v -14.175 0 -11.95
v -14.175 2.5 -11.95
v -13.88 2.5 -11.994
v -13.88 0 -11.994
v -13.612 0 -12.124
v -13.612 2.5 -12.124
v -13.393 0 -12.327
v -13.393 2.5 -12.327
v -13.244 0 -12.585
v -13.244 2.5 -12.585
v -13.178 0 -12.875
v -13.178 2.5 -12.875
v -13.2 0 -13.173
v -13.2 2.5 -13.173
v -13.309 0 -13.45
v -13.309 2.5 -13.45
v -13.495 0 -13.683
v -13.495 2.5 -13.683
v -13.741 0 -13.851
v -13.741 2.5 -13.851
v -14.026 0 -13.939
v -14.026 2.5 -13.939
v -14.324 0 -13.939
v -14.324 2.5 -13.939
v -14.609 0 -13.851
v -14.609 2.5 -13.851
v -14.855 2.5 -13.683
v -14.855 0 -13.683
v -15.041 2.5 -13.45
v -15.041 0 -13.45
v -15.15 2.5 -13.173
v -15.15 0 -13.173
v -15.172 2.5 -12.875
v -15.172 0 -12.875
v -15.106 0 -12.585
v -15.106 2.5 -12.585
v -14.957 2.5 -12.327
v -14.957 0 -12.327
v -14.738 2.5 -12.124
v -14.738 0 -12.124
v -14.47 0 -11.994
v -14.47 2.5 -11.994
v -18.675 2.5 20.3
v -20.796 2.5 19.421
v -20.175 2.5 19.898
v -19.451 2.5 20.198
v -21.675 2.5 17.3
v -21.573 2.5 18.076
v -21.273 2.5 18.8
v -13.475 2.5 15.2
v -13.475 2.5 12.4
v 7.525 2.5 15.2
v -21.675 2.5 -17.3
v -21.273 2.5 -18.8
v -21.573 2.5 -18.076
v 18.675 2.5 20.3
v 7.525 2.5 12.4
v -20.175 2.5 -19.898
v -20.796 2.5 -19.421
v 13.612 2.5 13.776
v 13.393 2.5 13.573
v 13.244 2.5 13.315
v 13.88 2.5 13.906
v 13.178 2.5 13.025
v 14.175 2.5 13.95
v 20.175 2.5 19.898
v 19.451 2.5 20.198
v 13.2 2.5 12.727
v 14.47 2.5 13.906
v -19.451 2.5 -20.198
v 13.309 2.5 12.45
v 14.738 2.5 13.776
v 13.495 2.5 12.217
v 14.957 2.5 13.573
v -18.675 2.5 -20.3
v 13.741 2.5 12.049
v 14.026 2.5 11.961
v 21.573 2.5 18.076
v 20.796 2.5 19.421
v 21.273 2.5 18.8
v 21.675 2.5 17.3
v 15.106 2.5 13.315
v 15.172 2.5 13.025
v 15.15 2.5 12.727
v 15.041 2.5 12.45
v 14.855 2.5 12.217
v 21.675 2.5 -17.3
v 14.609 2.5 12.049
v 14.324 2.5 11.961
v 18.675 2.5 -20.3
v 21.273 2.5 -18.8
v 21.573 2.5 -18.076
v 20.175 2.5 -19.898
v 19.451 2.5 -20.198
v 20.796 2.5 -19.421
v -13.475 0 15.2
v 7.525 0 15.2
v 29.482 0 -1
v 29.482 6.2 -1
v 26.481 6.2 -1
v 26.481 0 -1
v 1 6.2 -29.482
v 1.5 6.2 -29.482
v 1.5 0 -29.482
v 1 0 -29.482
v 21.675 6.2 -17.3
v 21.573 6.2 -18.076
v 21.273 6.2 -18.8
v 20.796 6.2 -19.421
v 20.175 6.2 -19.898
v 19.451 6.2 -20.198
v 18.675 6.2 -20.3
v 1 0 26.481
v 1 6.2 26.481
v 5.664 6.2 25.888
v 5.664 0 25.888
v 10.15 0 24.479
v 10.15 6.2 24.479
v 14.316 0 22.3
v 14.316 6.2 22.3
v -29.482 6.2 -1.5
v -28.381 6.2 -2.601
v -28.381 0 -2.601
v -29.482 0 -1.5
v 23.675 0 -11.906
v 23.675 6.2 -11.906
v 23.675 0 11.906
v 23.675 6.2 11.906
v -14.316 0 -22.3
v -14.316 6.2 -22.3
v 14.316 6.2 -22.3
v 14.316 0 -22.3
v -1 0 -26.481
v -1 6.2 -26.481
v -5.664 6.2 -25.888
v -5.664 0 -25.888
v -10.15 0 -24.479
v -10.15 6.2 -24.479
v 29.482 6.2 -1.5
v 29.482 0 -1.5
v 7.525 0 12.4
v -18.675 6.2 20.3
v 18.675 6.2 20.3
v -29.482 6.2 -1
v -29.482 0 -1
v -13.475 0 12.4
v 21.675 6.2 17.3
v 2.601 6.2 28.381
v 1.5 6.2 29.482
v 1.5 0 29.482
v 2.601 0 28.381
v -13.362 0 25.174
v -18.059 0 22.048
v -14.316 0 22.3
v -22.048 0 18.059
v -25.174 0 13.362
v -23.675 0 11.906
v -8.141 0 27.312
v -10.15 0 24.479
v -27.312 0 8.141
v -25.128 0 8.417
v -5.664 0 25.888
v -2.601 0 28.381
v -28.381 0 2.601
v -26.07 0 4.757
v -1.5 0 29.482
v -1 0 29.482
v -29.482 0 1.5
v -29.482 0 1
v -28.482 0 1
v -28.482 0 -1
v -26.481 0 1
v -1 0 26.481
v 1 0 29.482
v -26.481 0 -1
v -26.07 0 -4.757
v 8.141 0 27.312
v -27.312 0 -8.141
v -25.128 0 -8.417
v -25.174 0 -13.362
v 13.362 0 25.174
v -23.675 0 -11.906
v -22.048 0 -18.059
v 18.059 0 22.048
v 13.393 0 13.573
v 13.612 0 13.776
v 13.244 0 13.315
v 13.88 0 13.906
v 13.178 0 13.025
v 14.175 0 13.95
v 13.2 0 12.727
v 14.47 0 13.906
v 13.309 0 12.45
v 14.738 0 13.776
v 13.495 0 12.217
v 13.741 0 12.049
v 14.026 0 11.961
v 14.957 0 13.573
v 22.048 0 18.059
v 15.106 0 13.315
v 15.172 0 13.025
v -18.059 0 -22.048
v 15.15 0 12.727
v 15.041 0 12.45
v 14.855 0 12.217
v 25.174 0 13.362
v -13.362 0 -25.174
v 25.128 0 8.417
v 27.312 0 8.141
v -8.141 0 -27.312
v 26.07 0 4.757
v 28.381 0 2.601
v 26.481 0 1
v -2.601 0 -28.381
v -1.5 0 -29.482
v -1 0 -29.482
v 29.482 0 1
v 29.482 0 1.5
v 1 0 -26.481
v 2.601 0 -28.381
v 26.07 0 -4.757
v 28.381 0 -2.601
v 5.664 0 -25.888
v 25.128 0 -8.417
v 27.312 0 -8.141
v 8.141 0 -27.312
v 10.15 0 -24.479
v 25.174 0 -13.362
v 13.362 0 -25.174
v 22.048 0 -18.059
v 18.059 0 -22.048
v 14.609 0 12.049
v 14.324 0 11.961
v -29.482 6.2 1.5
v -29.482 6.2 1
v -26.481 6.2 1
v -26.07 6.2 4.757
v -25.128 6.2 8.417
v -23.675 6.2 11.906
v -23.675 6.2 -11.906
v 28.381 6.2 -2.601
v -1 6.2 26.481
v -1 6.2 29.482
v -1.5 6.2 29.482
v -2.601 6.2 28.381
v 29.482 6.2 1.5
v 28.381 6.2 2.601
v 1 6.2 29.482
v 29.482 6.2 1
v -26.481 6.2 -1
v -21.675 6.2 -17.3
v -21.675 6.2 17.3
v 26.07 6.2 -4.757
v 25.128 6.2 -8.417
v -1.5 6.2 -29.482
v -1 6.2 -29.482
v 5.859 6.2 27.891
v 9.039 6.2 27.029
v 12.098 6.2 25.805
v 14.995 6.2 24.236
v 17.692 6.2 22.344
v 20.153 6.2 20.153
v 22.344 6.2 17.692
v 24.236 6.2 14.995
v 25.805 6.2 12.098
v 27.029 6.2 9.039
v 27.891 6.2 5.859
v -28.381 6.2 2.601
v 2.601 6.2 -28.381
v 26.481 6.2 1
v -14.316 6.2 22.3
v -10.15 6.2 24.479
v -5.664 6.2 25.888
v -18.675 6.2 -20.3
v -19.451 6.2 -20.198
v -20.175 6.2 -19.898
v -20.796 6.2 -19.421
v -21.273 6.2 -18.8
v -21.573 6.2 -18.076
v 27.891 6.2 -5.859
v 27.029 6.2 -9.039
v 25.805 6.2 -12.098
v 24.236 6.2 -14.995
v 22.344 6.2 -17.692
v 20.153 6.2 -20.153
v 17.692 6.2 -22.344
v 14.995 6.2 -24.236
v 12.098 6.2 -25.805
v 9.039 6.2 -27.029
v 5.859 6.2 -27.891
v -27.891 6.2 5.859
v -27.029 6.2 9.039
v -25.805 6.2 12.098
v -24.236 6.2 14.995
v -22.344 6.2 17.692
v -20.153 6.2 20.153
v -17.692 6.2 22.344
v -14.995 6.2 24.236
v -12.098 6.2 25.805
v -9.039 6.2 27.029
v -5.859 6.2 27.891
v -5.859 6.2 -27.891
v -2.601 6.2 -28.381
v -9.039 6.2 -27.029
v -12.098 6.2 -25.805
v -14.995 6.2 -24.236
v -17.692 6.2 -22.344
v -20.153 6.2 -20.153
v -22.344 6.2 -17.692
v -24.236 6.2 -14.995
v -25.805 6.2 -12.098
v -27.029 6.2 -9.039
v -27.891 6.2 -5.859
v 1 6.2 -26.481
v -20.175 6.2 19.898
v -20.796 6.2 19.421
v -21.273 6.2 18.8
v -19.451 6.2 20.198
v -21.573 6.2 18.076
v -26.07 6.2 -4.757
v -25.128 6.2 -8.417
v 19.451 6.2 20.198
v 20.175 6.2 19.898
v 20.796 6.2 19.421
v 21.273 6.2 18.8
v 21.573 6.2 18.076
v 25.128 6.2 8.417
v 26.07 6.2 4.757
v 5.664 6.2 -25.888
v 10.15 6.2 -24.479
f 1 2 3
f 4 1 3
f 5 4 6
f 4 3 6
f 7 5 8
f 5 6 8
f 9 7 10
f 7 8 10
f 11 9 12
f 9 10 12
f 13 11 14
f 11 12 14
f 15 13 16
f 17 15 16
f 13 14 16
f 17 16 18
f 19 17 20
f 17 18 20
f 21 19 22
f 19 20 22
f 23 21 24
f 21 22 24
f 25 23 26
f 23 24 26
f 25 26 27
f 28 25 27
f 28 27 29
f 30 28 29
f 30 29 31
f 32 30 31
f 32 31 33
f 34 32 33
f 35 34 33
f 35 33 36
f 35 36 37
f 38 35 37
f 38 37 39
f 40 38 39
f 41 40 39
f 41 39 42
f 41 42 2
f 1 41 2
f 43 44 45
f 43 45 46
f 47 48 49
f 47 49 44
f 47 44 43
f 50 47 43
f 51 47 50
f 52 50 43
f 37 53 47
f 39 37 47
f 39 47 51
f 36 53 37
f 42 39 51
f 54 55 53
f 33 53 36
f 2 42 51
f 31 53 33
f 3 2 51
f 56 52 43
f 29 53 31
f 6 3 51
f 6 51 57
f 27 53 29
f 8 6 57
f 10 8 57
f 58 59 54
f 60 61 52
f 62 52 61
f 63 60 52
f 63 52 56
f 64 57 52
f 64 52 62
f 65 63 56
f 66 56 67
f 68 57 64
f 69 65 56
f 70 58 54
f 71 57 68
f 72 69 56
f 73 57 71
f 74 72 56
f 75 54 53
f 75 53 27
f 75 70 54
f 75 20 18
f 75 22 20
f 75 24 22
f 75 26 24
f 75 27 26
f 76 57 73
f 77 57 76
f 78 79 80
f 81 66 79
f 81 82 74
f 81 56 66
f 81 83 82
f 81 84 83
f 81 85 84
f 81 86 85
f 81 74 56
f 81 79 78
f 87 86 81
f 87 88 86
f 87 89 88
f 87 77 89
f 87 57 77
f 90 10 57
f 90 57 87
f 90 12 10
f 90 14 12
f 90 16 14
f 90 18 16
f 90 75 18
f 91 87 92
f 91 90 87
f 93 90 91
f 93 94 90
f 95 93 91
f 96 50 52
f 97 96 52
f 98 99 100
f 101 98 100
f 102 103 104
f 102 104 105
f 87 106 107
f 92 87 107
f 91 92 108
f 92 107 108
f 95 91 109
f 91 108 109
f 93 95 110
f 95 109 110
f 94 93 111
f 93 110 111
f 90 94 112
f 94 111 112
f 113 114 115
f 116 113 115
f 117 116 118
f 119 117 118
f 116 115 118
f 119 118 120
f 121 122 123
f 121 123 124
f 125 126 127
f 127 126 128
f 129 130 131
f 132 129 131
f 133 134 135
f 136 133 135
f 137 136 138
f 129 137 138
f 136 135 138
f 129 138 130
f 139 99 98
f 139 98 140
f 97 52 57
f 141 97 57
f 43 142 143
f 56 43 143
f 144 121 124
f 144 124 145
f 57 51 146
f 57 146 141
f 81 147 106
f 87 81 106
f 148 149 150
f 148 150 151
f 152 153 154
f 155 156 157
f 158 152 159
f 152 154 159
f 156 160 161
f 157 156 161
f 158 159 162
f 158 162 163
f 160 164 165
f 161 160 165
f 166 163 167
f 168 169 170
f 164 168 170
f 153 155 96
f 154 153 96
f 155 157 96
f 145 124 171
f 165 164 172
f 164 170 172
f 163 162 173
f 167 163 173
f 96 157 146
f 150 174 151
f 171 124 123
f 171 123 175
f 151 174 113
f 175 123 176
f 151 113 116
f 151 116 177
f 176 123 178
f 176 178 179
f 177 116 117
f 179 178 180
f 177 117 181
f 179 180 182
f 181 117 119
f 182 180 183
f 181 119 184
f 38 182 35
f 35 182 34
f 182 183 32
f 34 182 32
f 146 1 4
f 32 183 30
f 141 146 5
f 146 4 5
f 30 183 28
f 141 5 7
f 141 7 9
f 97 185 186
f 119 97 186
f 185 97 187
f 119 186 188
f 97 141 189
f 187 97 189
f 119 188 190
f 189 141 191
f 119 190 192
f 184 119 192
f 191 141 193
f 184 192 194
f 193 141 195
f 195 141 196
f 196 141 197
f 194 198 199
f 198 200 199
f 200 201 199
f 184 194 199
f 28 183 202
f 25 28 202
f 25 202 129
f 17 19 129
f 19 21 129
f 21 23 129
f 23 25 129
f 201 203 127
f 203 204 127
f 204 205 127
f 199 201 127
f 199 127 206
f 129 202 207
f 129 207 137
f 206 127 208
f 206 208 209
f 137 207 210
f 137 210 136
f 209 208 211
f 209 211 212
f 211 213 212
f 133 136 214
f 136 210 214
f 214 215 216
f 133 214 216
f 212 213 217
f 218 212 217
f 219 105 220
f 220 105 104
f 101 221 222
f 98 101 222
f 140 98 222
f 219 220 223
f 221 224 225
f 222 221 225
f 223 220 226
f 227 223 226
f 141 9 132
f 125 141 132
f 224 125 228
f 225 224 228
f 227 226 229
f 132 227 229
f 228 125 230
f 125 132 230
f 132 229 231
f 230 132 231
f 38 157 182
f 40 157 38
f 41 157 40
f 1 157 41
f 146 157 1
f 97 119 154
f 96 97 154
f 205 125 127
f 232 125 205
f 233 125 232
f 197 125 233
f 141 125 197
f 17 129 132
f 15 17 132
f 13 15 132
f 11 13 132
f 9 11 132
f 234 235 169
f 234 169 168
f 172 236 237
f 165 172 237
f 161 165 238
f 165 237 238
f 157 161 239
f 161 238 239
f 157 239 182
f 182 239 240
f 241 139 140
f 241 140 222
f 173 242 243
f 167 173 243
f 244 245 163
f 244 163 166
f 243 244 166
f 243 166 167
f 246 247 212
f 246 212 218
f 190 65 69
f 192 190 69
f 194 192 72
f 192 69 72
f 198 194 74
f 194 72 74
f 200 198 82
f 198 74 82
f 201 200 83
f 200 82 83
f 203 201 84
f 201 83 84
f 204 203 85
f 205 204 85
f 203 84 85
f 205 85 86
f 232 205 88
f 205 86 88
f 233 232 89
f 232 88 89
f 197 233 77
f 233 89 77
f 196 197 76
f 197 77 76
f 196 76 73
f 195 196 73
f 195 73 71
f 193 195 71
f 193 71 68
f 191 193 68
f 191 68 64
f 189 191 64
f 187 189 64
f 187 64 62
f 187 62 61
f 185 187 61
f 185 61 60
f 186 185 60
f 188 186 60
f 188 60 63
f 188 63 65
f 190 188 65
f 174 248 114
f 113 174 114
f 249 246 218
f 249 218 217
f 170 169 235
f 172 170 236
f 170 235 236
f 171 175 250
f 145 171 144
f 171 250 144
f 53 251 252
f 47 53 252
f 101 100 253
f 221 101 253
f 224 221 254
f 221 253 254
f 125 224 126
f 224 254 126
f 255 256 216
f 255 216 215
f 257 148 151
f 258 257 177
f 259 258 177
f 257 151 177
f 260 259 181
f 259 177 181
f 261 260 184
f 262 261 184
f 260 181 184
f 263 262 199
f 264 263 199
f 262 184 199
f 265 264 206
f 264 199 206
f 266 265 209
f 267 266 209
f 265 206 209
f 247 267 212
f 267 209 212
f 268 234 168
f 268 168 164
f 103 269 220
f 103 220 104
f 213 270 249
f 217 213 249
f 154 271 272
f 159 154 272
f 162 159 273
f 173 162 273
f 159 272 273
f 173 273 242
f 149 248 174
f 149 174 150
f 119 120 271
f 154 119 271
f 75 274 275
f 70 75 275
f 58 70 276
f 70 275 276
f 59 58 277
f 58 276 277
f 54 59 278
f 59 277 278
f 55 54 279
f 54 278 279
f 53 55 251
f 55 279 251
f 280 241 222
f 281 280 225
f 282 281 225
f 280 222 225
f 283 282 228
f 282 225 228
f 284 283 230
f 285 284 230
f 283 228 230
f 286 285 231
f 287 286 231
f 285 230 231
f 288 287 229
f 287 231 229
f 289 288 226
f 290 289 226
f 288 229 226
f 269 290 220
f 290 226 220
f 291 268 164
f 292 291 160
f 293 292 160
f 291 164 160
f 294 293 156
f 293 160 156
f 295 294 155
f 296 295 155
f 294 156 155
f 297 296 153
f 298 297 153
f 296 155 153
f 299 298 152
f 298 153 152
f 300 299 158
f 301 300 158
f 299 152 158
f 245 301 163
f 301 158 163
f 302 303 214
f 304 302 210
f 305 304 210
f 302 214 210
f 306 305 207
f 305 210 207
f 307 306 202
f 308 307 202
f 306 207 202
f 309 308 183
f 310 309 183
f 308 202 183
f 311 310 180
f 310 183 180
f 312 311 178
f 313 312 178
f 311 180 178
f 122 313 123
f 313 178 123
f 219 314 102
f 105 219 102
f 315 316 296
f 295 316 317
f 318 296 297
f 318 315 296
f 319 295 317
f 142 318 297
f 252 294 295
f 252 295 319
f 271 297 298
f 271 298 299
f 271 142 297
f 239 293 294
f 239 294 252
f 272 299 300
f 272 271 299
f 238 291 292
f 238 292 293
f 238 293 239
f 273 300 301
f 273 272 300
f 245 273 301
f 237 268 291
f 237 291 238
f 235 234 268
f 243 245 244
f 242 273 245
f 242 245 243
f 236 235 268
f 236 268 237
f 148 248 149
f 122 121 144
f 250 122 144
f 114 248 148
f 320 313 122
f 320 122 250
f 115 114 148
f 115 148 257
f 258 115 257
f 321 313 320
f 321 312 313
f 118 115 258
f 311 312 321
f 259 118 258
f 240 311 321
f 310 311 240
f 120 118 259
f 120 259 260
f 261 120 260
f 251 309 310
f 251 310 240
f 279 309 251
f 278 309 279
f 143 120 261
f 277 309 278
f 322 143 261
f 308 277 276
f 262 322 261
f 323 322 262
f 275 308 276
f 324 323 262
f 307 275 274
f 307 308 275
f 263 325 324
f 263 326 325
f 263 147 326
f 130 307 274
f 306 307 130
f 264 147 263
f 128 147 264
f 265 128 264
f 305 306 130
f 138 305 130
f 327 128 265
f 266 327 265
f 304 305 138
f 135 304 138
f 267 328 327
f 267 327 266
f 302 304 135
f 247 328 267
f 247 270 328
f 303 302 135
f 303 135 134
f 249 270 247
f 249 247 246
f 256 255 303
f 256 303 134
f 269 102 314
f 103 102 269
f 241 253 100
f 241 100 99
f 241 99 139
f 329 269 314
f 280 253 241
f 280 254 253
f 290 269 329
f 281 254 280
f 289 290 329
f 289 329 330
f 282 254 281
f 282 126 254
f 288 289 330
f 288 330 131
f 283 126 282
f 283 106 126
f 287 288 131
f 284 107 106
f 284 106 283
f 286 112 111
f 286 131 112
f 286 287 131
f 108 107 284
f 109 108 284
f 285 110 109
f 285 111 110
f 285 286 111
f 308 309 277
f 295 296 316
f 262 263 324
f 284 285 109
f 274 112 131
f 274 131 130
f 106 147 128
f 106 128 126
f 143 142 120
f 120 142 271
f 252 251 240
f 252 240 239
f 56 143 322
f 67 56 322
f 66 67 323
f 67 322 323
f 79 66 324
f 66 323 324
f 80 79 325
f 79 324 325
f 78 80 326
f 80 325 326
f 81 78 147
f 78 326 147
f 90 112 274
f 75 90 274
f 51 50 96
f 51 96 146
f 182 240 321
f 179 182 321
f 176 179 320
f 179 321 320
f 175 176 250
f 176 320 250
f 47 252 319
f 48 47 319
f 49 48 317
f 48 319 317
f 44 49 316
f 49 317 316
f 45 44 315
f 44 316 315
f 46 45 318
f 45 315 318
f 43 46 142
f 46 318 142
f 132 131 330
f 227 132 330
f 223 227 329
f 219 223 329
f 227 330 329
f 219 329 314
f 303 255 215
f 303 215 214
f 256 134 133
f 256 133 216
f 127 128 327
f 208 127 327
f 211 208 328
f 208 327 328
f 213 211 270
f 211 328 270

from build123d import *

# Parameters (mm, degrees)
SKETCH1_R           = 28.5
BOSS_EXTRUDE1_DEPTH = 6.2
CUT_EXTRUDE1_DEPTH  = 3.7
CUT_EXTRUDE2_REACH  = 42.475
SKETCH3_R           = 1
SKETCH3_W           = 21
SKETCH3_H           = 2.8
CUT_EXTRUDE3_REACH  = 42.779
BOSS_EXTRUDE2_DEPTH = 6.2


with BuildPart() as part:
    # Sketch1 → Boss-Extrude1 (new body)
    with BuildSketch(Plane(origin=(0, 0, 0), x_dir=(1, 0, 0), z_dir=(0, 1, 0))):
        with Locations(Location((0, 0, 0), (0, 0, 90))):
            Circle(SKETCH1_R)
    extrude(amount=BOSS_EXTRUDE1_DEPTH)

    # Sketch2 → Cut-Extrude1 (cut)
    with BuildSketch(Plane(origin=(0, 6.2, 0), x_dir=(1, 0, 0), z_dir=(0, 1, 0))):
        with BuildLine():
            Line((18.675, 20.3), (-18.675, 20.3))
            ThreePointArc((-18.675, 20.3), (-20.796320344, 19.421320344), (-21.675, 17.3))
            Line((-21.675, 17.3), (-21.675, -17.3))
            ThreePointArc((-21.675, -17.3), (-20.796320374, -19.421320313), (-18.675000086, -20.3))
            Line((-18.675000086, -20.3), (18.675, -20.3))
            ThreePointArc((18.675, -20.3), (20.796320344, -19.421320344), (21.675, -17.3))
            Line((21.675, -17.3), (21.675, 17.3))
            ThreePointArc((21.675, 17.3), (20.796320344, 19.421320344), (18.675, 20.3))
        make_face()
    extrude(amount=-CUT_EXTRUDE1_DEPTH, mode=Mode.SUBTRACT)

    # Sketch3 → Cut-Extrude2 (cut, up to next)
    with BuildSketch(Plane(origin=(0, 2.5, 0), x_dir=(1, 0, 0), z_dir=(0, 1, 0)), mode=Mode.PRIVATE) as cut_extrude2_sk1:
        with Locations(Location((-14.175, 12.95, 0), (0, 0, 270))):
            Circle(SKETCH3_R)
    cut_extrude2_tool1 = extrude(cut_extrude2_sk1.sketch, amount=-CUT_EXTRUDE2_REACH, mode=Mode.PRIVATE) & part.part
    # Sketch3 → Cut-Extrude2 (cut, up to next)
    with BuildSketch(Plane(origin=(0, 2.5, 0), x_dir=(1, 0, 0), z_dir=(0, 1, 0)), mode=Mode.PRIVATE) as cut_extrude2_sk2:
        with Locations((-2.975, -13.8)):
            Rectangle(SKETCH3_W, SKETCH3_H)
    cut_extrude2_tool2 = extrude(cut_extrude2_sk2.sketch, amount=-CUT_EXTRUDE2_REACH, mode=Mode.PRIVATE) & part.part
    # Sketch3 → Cut-Extrude2 (cut, up to next)
    with BuildSketch(Plane(origin=(0, 2.5, 0), x_dir=(1, 0, 0), z_dir=(0, 1, 0)), mode=Mode.PRIVATE) as cut_extrude2_sk3:
        with Locations(Location((14.175, -12.95, 0), (0, 0, 270))):
            Circle(SKETCH3_R)
    cut_extrude2_tool3 = extrude(cut_extrude2_sk3.sketch, amount=-CUT_EXTRUDE2_REACH, mode=Mode.PRIVATE) & part.part
    add(cut_extrude2_tool1.solids().sort_by_distance((-14.175, 2.5, -12.95))[0], mode=Mode.SUBTRACT)
    add(cut_extrude2_tool2.solids().sort_by_distance((-2.975, 2.5, 13.8))[0], mode=Mode.SUBTRACT)
    add(cut_extrude2_tool3.solids().sort_by_distance((14.175, 2.5, 12.95))[0], mode=Mode.SUBTRACT)

    # Sketch4 → Cut-Extrude3 (cut, up to next)
    with BuildSketch(Plane(origin=(0, 6.2, 0), x_dir=(1, 0, 0), z_dir=(0, 1, 0)), mode=Mode.PRIVATE) as cut_extrude3_sk1:
        with BuildLine():
            ThreePointArc((-1, 26.481125354), (-7.938429591, 25.283024653), (-14.316424135, 22.3))
            Line((-14.316424135, 22.3), (-1, 22.3))
            Line((-1, 22.3), (-1, 26.481125354))
        make_face()
    cut_extrude3_tool1 = extrude(cut_extrude3_sk1.sketch, amount=-CUT_EXTRUDE3_REACH, mode=Mode.PRIVATE) & part.part
    # Sketch4 → Cut-Extrude3 (cut, up to next)
    with BuildSketch(Plane(origin=(0, 6.2, 0), x_dir=(1, 0, 0), z_dir=(0, 1, 0)), mode=Mode.PRIVATE) as cut_extrude3_sk2:
        with BuildLine():
            Line((1, 26.481125354), (1, 22.3))
            Line((1, 22.3), (14.316424135, 22.3))
            ThreePointArc((14.316424135, 22.3), (7.938429591, 25.283024653), (1, 26.481125354))
        make_face()
    cut_extrude3_tool2 = extrude(cut_extrude3_sk2.sketch, amount=-CUT_EXTRUDE3_REACH, mode=Mode.PRIVATE) & part.part
    # Sketch4 → Cut-Extrude3 (cut, up to next)
    with BuildSketch(Plane(origin=(0, 6.2, 0), x_dir=(1, 0, 0), z_dir=(0, 1, 0)), mode=Mode.PRIVATE) as cut_extrude3_sk3:
        with BuildLine():
            ThreePointArc((0, 28.5), (-0.500076988, 28.495612347), (-1, 28.482450737))
            Line((-1, 28.482450737), (-1, 26.481125354))
            ThreePointArc((-1, 26.481125354), (0, 26.5), (1, 26.481125354))
            Line((1, 26.481125354), (1, 28.482450737))
            ThreePointArc((1, 28.482450737), (0.500076988, 28.495612347), (0, 28.5))
        make_face()
    cut_extrude3_tool3 = extrude(cut_extrude3_sk3.sketch, amount=-CUT_EXTRUDE3_REACH, mode=Mode.PRIVATE) & part.part
    # Sketch4 → Cut-Extrude3 (cut, up to next)
    with BuildSketch(Plane(origin=(0, 6.2, 0), x_dir=(1, 0, 0), z_dir=(0, 1, 0)), mode=Mode.PRIVATE) as cut_extrude3_sk4:
        with BuildLine():
            Line((-1, -26.481125354), (-1, -28.482450737))
            ThreePointArc((-1, -28.482450737), (-0.500077047, -28.495612346), (-1.18e-07, -28.5))
            ThreePointArc((-1.18e-07, -28.5), (0.500076929, -28.495612348), (1, -28.482450737))
            Line((1, -28.482450737), (1, -26.481125354))
            ThreePointArc((1, -26.481125354), (0, -26.5), (-1, -26.481125354))
        make_face()
    cut_extrude3_tool4 = extrude(cut_extrude3_sk4.sketch, amount=-CUT_EXTRUDE3_REACH, mode=Mode.PRIVATE) & part.part
    # Sketch4 → Cut-Extrude3 (cut, up to next)
    with BuildSketch(Plane(origin=(0, 6.2, 0), x_dir=(1, 0, 0), z_dir=(0, 1, 0)), mode=Mode.PRIVATE) as cut_extrude3_sk5:
        with BuildLine():
            Line((-1, 26.481125354), (-1, 22.3))
            Line((-1, 22.3), (1, 22.3))
            Line((1, 22.3), (1, 26.481125354))
            ThreePointArc((1, 26.481125354), (0, 26.5), (-1, 26.481125354))
        make_face()
    cut_extrude3_tool5 = extrude(cut_extrude3_sk5.sketch, amount=-CUT_EXTRUDE3_REACH, mode=Mode.PRIVATE) & part.part
    # Sketch4 → Cut-Extrude3 (cut, up to next)
    with BuildSketch(Plane(origin=(0, 6.2, 0), x_dir=(1, 0, 0), z_dir=(0, 1, 0)), mode=Mode.PRIVATE) as cut_extrude3_sk6:
        with BuildLine():
            Line((-26.481125354, 1), (-28.482450737, 1))
            ThreePointArc((-28.482450737, 1), (-28.495612347, 0.500076988), (-28.5, 0))
            ThreePointArc((-28.5, 0), (-28.495612347, -0.500076988), (-28.482450737, -1))
            Line((-28.482450737, -1), (-26.481125354, -1))
            ThreePointArc((-26.481125354, -1), (-26.5, 0), (-26.481125354, 1))
        make_face()
    cut_extrude3_tool6 = extrude(cut_extrude3_sk6.sketch, amount=-CUT_EXTRUDE3_REACH, mode=Mode.PRIVATE) & part.part
    # Sketch4 → Cut-Extrude3 (cut, up to next)
    with BuildSketch(Plane(origin=(0, 6.2, 0), x_dir=(1, 0, 0), z_dir=(0, 1, 0)), mode=Mode.PRIVATE) as cut_extrude3_sk7:
        with BuildLine():
            Line((28.482450737, 1), (26.481125354, 1))
            ThreePointArc((26.481125354, 1), (26.495280918, 0.500089055), (26.5, 0))
            ThreePointArc((26.5, 0), (26.495280918, -0.500089055), (26.481125354, -1))
            Line((26.481125354, -1), (28.482450737, -1))
            ThreePointArc((28.482450737, -1), (28.495612347, -0.500076988), (28.5, 0))
            ThreePointArc((28.5, 0), (28.495612347, 0.500076988), (28.482450737, 1))
        make_face()
    cut_extrude3_tool7 = extrude(cut_extrude3_sk7.sketch, amount=-CUT_EXTRUDE3_REACH, mode=Mode.PRIVATE) & part.part
    # Sketch4 → Cut-Extrude3 (cut, up to next)
    with BuildSketch(Plane(origin=(0, 6.2, 0), x_dir=(1, 0, 0), z_dir=(0, 1, 0)), mode=Mode.PRIVATE) as cut_extrude3_sk8:
        with BuildLine():
            Line((-23.675, 1), (-26.481125354, 1))
            ThreePointArc((-26.481125354, 1), (-26.5, 0), (-26.481125354, -1))
            Line((-26.481125354, -1), (-23.675, -1))
            Line((-23.675, -1), (-23.675, 1))
        make_face()
    cut_extrude3_tool8 = extrude(cut_extrude3_sk8.sketch, amount=-CUT_EXTRUDE3_REACH, mode=Mode.PRIVATE) & part.part
    # Sketch4 → Cut-Extrude3 (cut, up to next)
    with BuildSketch(Plane(origin=(0, 6.2, 0), x_dir=(1, 0, 0), z_dir=(0, 1, 0)), mode=Mode.PRIVATE) as cut_extrude3_sk9:
        with BuildLine():
            ThreePointArc((-23.675, 11.90564467), (-25.664031231, 6.603597577), (-26.481125354, 1))
            Line((-26.481125354, 1), (-23.675, 1))
            Line((-23.675, 1), (-23.675, 11.90564467))
        make_face()
    cut_extrude3_tool9 = extrude(cut_extrude3_sk9.sketch, amount=-CUT_EXTRUDE3_REACH, mode=Mode.PRIVATE) & part.part
    # Sketch4 → Cut-Extrude3 (cut, up to next)
    with BuildSketch(Plane(origin=(0, 6.2, 0), x_dir=(1, 0, 0), z_dir=(0, 1, 0)), mode=Mode.PRIVATE) as cut_extrude3_sk10:
        with BuildLine():
            Line((-23.675, -1), (-26.481125354, -1))
            ThreePointArc((-26.481125354, -1), (-25.664031231, -6.603597577), (-23.675, -11.90564467))
            Line((-23.675, -11.90564467), (-23.675, -1))
        make_face()
    cut_extrude3_tool10 = extrude(cut_extrude3_sk10.sketch, amount=-CUT_EXTRUDE3_REACH, mode=Mode.PRIVATE) & part.part
    # Sketch4 → Cut-Extrude3 (cut, up to next)
    with BuildSketch(Plane(origin=(0, 6.2, 0), x_dir=(1, 0, 0), z_dir=(0, 1, 0)), mode=Mode.PRIVATE) as cut_extrude3_sk11:
        with BuildLine():
            Line((-1, -22.3), (-14.316424135, -22.3))
            ThreePointArc((-14.316424135, -22.3), (-7.938429591, -25.283024653), (-1, -26.481125354))
            Line((-1, -26.481125354), (-1, -22.3))
        make_face()
    cut_extrude3_tool11 = extrude(cut_extrude3_sk11.sketch, amount=-CUT_EXTRUDE3_REACH, mode=Mode.PRIVATE) & part.part
    # Sketch4 → Cut-Extrude3 (cut, up to next)
    with BuildSketch(Plane(origin=(0, 6.2, 0), x_dir=(1, 0, 0), z_dir=(0, 1, 0)), mode=Mode.PRIVATE) as cut_extrude3_sk12:
        with BuildLine():
            Line((14.316424135, -22.3), (1, -22.3))
            Line((1, -22.3), (1, -26.481125354))
            ThreePointArc((1, -26.481125354), (7.938429591, -25.283024653), (14.316424135, -22.3))
        make_face()
    cut_extrude3_tool12 = extrude(cut_extrude3_sk12.sketch, amount=-CUT_EXTRUDE3_REACH, mode=Mode.PRIVATE) & part.part
    # Sketch4 → Cut-Extrude3 (cut, up to next)
    with BuildSketch(Plane(origin=(0, 6.2, 0), x_dir=(1, 0, 0), z_dir=(0, 1, 0)), mode=Mode.PRIVATE) as cut_extrude3_sk13:
        with BuildLine():
            Line((1, -22.3), (-1, -22.3))
            Line((-1, -22.3), (-1, -26.481125354))
            ThreePointArc((-1, -26.481125354), (0, -26.5), (1, -26.481125354))
            Line((1, -26.481125354), (1, -22.3))
        make_face()
    cut_extrude3_tool13 = extrude(cut_extrude3_sk13.sketch, amount=-CUT_EXTRUDE3_REACH, mode=Mode.PRIVATE) & part.part
    # Sketch4 → Cut-Extrude3 (cut, up to next)
    with BuildSketch(Plane(origin=(0, 6.2, 0), x_dir=(1, 0, 0), z_dir=(0, 1, 0)), mode=Mode.PRIVATE) as cut_extrude3_sk14:
        with BuildLine():
            ThreePointArc((0, 28.5), (-0.500076988, 28.495612347), (-1, 28.482450737))
            Line((-1, 28.482450737), (-1, 26.481125354))
            ThreePointArc((-1, 26.481125354), (0, 26.5), (1, 26.481125354))
            Line((1, 26.481125354), (1, 28.482450737))
            ThreePointArc((1, 28.482450737), (0.500076988, 28.495612347), (0, 28.5))
        make_face()
    cut_extrude3_tool14 = extrude(cut_extrude3_sk14.sketch, amount=-CUT_EXTRUDE3_REACH, mode=Mode.PRIVATE) & part.part
    # Sketch4 → Cut-Extrude3 (cut, up to next)
    with BuildSketch(Plane(origin=(0, 6.2, 0), x_dir=(1, 0, 0), z_dir=(0, 1, 0)), mode=Mode.PRIVATE) as cut_extrude3_sk15:
        with BuildLine():
            Line((-1, -26.481125354), (-1, -28.482450737))
            ThreePointArc((-1, -28.482450737), (-0.500077047, -28.495612346), (-1.18e-07, -28.5))
            ThreePointArc((-1.18e-07, -28.5), (0.500076929, -28.495612348), (1, -28.482450737))
            Line((1, -28.482450737), (1, -26.481125354))
            ThreePointArc((1, -26.481125354), (0, -26.5), (-1, -26.481125354))
        make_face()
    cut_extrude3_tool15 = extrude(cut_extrude3_sk15.sketch, amount=-CUT_EXTRUDE3_REACH, mode=Mode.PRIVATE) & part.part
    # Sketch4 → Cut-Extrude3 (cut, up to next)
    with BuildSketch(Plane(origin=(0, 6.2, 0), x_dir=(1, 0, 0), z_dir=(0, 1, 0)), mode=Mode.PRIVATE) as cut_extrude3_sk16:
        with BuildLine():
            Line((23.675, 11.90564467), (23.675, 1))
            Line((23.675, 1), (26.481125354, 1))
            ThreePointArc((26.481125354, 1), (25.664031231, 6.603597577), (23.675, 11.90564467))
        make_face()
    cut_extrude3_tool16 = extrude(cut_extrude3_sk16.sketch, amount=-CUT_EXTRUDE3_REACH, mode=Mode.PRIVATE) & part.part
    # Sketch4 → Cut-Extrude3 (cut, up to next)
    with BuildSketch(Plane(origin=(0, 6.2, 0), x_dir=(1, 0, 0), z_dir=(0, 1, 0)), mode=Mode.PRIVATE) as cut_extrude3_sk17:
        with BuildLine():
            Line((26.481125354, -1), (23.675, -1))
            Line((23.675, -1), (23.675, -11.90564467))
            ThreePointArc((23.675, -11.90564467), (25.664031231, -6.603597577), (26.481125354, -1))
        make_face()
    cut_extrude3_tool17 = extrude(cut_extrude3_sk17.sketch, amount=-CUT_EXTRUDE3_REACH, mode=Mode.PRIVATE) & part.part
    # Sketch4 → Cut-Extrude3 (cut, up to next)
    with BuildSketch(Plane(origin=(0, 6.2, 0), x_dir=(1, 0, 0), z_dir=(0, 1, 0)), mode=Mode.PRIVATE) as cut_extrude3_sk18:
        with BuildLine():
            Line((26.481125354, 1), (23.675, 1))
            Line((23.675, 1), (23.675, -1))
            Line((23.675, -1), (26.481125354, -1))
            ThreePointArc((26.481125354, -1), (26.495280918, -0.500089055), (26.5, 0))
            ThreePointArc((26.5, 0), (26.495280918, 0.500089055), (26.481125354, 1))
        make_face()
    cut_extrude3_tool18 = extrude(cut_extrude3_sk18.sketch, amount=-CUT_EXTRUDE3_REACH, mode=Mode.PRIVATE) & part.part
    # Sketch4 → Cut-Extrude3 (cut, up to next)
    with BuildSketch(Plane(origin=(0, 6.2, 0), x_dir=(1, 0, 0), z_dir=(0, 1, 0)), mode=Mode.PRIVATE) as cut_extrude3_sk19:
        with BuildLine():
            Line((-26.481125354, 1), (-28.482450737, 1))
            ThreePointArc((-28.482450737, 1), (-28.495612347, 0.500076988), (-28.5, 0))
            ThreePointArc((-28.5, 0), (-28.495612347, -0.500076988), (-28.482450737, -1))
            Line((-28.482450737, -1), (-26.481125354, -1))
            ThreePointArc((-26.481125354, -1), (-26.5, 0), (-26.481125354, 1))
        make_face()
    cut_extrude3_tool19 = extrude(cut_extrude3_sk19.sketch, amount=-CUT_EXTRUDE3_REACH, mode=Mode.PRIVATE) & part.part
    # Sketch4 → Cut-Extrude3 (cut, up to next)
    with BuildSketch(Plane(origin=(0, 6.2, 0), x_dir=(1, 0, 0), z_dir=(0, 1, 0)), mode=Mode.PRIVATE) as cut_extrude3_sk20:
        with BuildLine():
            Line((28.482450737, 1), (26.481125354, 1))
            ThreePointArc((26.481125354, 1), (26.495280918, 0.500089055), (26.5, 0))
            ThreePointArc((26.5, 0), (26.495280918, -0.500089055), (26.481125354, -1))
            Line((26.481125354, -1), (28.482450737, -1))
            ThreePointArc((28.482450737, -1), (28.495612347, -0.500076988), (28.5, 0))
            ThreePointArc((28.5, 0), (28.495612347, 0.500076988), (28.482450737, 1))
        make_face()
    cut_extrude3_tool20 = extrude(cut_extrude3_sk20.sketch, amount=-CUT_EXTRUDE3_REACH, mode=Mode.PRIVATE) & part.part
    add(cut_extrude3_tool1.solids().sort_by_distance((-5.995694, 6.2, -23.945534))[0], mode=Mode.SUBTRACT)
    add(cut_extrude3_tool2.solids().sort_by_distance((5.995694, 6.2, -23.945534))[0], mode=Mode.SUBTRACT)
    add(cut_extrude3_tool3.solids().sort_by_distance((0, 6.2, -27.493929))[0], mode=Mode.SUBTRACT)
    add(cut_extrude3_tool4.solids().sort_by_distance((0, 6.2, 27.493929))[0], mode=Mode.SUBTRACT)
    add(cut_extrude3_tool5.solids().sort_by_distance((0, 6.2, -24.396858))[0], mode=Mode.SUBTRACT)
    add(cut_extrude3_tool6.solids().sort_by_distance((-27.493929, 6.2, 0))[0], mode=Mode.SUBTRACT)
    add(cut_extrude3_tool7.solids().sort_by_distance((27.493929, 6.2, 0))[0], mode=Mode.SUBTRACT)
    add(cut_extrude3_tool8.solids().sort_by_distance((-25.08436, 6.2, 0))[0], mode=Mode.SUBTRACT)
    add(cut_extrude3_tool9.solids().sort_by_distance((-24.771422, 6.2, -5.065858))[0], mode=Mode.SUBTRACT)
    add(cut_extrude3_tool10.solids().sort_by_distance((-24.771422, 6.2, 5.065858))[0], mode=Mode.SUBTRACT)
    add(cut_extrude3_tool11.solids().sort_by_distance((-5.995694, 6.2, 23.945534))[0], mode=Mode.SUBTRACT)
    add(cut_extrude3_tool12.solids().sort_by_distance((5.995694, 6.2, 23.945534))[0], mode=Mode.SUBTRACT)
    add(cut_extrude3_tool13.solids().sort_by_distance((0, 6.2, 24.396858))[0], mode=Mode.SUBTRACT)
    add(cut_extrude3_tool14.solids().sort_by_distance((0, 6.2, -27.493929))[0], mode=Mode.SUBTRACT)
    add(cut_extrude3_tool15.solids().sort_by_distance((0, 6.2, 27.493929))[0], mode=Mode.SUBTRACT)
    add(cut_extrude3_tool16.solids().sort_by_distance((24.771422, 6.2, -5.065858))[0], mode=Mode.SUBTRACT)
    add(cut_extrude3_tool17.solids().sort_by_distance((24.771422, 6.2, 5.065858))[0], mode=Mode.SUBTRACT)
    add(cut_extrude3_tool18.solids().sort_by_distance((25.08436, 6.2, 0))[0], mode=Mode.SUBTRACT)
    add(cut_extrude3_tool19.solids().sort_by_distance((-27.493929, 6.2, 0))[0], mode=Mode.SUBTRACT)
    add(cut_extrude3_tool20.solids().sort_by_distance((27.493929, 6.2, 0))[0], mode=Mode.SUBTRACT)

    # Sketch5 → Boss-Extrude2 (add)
    with BuildSketch(Plane(origin=(0, 6.2, 0), x_dir=(1, 0, 0), z_dir=(0, 1, 0))):
        with BuildLine():
            ThreePointArc((-2.601425658, 28.381025079), (-1.801426791, 28.443010767), (-1, 28.482450737))
            Line((-1, 28.482450737), (-1, 29.482450737))
            Line((-1, 29.482450737), (-1.5, 29.482450737))
            Line((-1.5, 29.482450737), (-2.601425658, 28.381025079))
        make_face()
        with BuildLine():
            Line((1, 29.482450737), (1, 28.482450737))
            ThreePointArc((1, 28.482450737), (1.801426791, 28.443010767), (2.601425658, 28.381025079))
            Line((2.601425658, 28.381025079), (1.5, 29.482450737))
            Line((1.5, 29.482450737), (1, 29.482450737))
        make_face()
        with BuildLine():
            Line((29.482450737, 1.5), (28.381025079, 2.601425658))
            ThreePointArc((28.381025079, 2.601425658), (28.443010767, 1.801426791), (28.482450737, 1))
            Line((28.482450737, 1), (29.482450737, 1))
            Line((29.482450737, 1), (29.482450737, 1.5))
        make_face()
        with BuildLine():
            Line((29.482450737, -1), (28.482450737, -1))
            ThreePointArc((28.482450737, -1), (28.443010767, -1.801426791), (28.381025079, -2.601425658))
            Line((28.381025079, -2.601425658), (29.482450737, -1.5))
            Line((29.482450737, -1.5), (29.482450737, -1))
        make_face()
        with BuildLine():
            ThreePointArc((-28.381025079, -2.601425658), (-28.443010767, -1.801426791), (-28.482450737, -1))
            Line((-28.482450737, -1), (-29.482450737, -1))
            Line((-29.482450737, -1), (-29.482450737, -1.5))
            Line((-29.482450737, -1.5), (-28.381025079, -2.601425658))
        make_face()
        with BuildLine():
            ThreePointArc((-28.482450737, 1), (-28.443010767, 1.801426791), (-28.381025079, 2.601425658))
            Line((-28.381025079, 2.601425658), (-29.482450737, 1.5))
            Line((-29.482450737, 1.5), (-29.482450737, 1))
            Line((-29.482450737, 1), (-28.482450737, 1))
        make_face()
        with BuildLine():
            ThreePointArc((-1, -28.482450737), (-1.801426791, -28.443010767), (-2.601425658, -28.381025079))
            Line((-2.601425658, -28.381025079), (-1.5, -29.482450737))
            Line((-1.5, -29.482450737), (-1, -29.482450737))
            Line((-1, -29.482450737), (-1, -28.482450737))
        make_face()
        with BuildLine():
            Line((1.5, -29.482450737), (2.601425658, -28.381025079))
            ThreePointArc((2.601425658, -28.381025079), (1.801426791, -28.443010767), (1, -28.482450737))
            Line((1, -28.482450737), (1, -29.482450737))
            Line((1, -29.482450737), (1.5, -29.482450737))
        make_face()
    extrude(amount=-BOSS_EXTRUDE2_DEPTH)


solid = part.part
